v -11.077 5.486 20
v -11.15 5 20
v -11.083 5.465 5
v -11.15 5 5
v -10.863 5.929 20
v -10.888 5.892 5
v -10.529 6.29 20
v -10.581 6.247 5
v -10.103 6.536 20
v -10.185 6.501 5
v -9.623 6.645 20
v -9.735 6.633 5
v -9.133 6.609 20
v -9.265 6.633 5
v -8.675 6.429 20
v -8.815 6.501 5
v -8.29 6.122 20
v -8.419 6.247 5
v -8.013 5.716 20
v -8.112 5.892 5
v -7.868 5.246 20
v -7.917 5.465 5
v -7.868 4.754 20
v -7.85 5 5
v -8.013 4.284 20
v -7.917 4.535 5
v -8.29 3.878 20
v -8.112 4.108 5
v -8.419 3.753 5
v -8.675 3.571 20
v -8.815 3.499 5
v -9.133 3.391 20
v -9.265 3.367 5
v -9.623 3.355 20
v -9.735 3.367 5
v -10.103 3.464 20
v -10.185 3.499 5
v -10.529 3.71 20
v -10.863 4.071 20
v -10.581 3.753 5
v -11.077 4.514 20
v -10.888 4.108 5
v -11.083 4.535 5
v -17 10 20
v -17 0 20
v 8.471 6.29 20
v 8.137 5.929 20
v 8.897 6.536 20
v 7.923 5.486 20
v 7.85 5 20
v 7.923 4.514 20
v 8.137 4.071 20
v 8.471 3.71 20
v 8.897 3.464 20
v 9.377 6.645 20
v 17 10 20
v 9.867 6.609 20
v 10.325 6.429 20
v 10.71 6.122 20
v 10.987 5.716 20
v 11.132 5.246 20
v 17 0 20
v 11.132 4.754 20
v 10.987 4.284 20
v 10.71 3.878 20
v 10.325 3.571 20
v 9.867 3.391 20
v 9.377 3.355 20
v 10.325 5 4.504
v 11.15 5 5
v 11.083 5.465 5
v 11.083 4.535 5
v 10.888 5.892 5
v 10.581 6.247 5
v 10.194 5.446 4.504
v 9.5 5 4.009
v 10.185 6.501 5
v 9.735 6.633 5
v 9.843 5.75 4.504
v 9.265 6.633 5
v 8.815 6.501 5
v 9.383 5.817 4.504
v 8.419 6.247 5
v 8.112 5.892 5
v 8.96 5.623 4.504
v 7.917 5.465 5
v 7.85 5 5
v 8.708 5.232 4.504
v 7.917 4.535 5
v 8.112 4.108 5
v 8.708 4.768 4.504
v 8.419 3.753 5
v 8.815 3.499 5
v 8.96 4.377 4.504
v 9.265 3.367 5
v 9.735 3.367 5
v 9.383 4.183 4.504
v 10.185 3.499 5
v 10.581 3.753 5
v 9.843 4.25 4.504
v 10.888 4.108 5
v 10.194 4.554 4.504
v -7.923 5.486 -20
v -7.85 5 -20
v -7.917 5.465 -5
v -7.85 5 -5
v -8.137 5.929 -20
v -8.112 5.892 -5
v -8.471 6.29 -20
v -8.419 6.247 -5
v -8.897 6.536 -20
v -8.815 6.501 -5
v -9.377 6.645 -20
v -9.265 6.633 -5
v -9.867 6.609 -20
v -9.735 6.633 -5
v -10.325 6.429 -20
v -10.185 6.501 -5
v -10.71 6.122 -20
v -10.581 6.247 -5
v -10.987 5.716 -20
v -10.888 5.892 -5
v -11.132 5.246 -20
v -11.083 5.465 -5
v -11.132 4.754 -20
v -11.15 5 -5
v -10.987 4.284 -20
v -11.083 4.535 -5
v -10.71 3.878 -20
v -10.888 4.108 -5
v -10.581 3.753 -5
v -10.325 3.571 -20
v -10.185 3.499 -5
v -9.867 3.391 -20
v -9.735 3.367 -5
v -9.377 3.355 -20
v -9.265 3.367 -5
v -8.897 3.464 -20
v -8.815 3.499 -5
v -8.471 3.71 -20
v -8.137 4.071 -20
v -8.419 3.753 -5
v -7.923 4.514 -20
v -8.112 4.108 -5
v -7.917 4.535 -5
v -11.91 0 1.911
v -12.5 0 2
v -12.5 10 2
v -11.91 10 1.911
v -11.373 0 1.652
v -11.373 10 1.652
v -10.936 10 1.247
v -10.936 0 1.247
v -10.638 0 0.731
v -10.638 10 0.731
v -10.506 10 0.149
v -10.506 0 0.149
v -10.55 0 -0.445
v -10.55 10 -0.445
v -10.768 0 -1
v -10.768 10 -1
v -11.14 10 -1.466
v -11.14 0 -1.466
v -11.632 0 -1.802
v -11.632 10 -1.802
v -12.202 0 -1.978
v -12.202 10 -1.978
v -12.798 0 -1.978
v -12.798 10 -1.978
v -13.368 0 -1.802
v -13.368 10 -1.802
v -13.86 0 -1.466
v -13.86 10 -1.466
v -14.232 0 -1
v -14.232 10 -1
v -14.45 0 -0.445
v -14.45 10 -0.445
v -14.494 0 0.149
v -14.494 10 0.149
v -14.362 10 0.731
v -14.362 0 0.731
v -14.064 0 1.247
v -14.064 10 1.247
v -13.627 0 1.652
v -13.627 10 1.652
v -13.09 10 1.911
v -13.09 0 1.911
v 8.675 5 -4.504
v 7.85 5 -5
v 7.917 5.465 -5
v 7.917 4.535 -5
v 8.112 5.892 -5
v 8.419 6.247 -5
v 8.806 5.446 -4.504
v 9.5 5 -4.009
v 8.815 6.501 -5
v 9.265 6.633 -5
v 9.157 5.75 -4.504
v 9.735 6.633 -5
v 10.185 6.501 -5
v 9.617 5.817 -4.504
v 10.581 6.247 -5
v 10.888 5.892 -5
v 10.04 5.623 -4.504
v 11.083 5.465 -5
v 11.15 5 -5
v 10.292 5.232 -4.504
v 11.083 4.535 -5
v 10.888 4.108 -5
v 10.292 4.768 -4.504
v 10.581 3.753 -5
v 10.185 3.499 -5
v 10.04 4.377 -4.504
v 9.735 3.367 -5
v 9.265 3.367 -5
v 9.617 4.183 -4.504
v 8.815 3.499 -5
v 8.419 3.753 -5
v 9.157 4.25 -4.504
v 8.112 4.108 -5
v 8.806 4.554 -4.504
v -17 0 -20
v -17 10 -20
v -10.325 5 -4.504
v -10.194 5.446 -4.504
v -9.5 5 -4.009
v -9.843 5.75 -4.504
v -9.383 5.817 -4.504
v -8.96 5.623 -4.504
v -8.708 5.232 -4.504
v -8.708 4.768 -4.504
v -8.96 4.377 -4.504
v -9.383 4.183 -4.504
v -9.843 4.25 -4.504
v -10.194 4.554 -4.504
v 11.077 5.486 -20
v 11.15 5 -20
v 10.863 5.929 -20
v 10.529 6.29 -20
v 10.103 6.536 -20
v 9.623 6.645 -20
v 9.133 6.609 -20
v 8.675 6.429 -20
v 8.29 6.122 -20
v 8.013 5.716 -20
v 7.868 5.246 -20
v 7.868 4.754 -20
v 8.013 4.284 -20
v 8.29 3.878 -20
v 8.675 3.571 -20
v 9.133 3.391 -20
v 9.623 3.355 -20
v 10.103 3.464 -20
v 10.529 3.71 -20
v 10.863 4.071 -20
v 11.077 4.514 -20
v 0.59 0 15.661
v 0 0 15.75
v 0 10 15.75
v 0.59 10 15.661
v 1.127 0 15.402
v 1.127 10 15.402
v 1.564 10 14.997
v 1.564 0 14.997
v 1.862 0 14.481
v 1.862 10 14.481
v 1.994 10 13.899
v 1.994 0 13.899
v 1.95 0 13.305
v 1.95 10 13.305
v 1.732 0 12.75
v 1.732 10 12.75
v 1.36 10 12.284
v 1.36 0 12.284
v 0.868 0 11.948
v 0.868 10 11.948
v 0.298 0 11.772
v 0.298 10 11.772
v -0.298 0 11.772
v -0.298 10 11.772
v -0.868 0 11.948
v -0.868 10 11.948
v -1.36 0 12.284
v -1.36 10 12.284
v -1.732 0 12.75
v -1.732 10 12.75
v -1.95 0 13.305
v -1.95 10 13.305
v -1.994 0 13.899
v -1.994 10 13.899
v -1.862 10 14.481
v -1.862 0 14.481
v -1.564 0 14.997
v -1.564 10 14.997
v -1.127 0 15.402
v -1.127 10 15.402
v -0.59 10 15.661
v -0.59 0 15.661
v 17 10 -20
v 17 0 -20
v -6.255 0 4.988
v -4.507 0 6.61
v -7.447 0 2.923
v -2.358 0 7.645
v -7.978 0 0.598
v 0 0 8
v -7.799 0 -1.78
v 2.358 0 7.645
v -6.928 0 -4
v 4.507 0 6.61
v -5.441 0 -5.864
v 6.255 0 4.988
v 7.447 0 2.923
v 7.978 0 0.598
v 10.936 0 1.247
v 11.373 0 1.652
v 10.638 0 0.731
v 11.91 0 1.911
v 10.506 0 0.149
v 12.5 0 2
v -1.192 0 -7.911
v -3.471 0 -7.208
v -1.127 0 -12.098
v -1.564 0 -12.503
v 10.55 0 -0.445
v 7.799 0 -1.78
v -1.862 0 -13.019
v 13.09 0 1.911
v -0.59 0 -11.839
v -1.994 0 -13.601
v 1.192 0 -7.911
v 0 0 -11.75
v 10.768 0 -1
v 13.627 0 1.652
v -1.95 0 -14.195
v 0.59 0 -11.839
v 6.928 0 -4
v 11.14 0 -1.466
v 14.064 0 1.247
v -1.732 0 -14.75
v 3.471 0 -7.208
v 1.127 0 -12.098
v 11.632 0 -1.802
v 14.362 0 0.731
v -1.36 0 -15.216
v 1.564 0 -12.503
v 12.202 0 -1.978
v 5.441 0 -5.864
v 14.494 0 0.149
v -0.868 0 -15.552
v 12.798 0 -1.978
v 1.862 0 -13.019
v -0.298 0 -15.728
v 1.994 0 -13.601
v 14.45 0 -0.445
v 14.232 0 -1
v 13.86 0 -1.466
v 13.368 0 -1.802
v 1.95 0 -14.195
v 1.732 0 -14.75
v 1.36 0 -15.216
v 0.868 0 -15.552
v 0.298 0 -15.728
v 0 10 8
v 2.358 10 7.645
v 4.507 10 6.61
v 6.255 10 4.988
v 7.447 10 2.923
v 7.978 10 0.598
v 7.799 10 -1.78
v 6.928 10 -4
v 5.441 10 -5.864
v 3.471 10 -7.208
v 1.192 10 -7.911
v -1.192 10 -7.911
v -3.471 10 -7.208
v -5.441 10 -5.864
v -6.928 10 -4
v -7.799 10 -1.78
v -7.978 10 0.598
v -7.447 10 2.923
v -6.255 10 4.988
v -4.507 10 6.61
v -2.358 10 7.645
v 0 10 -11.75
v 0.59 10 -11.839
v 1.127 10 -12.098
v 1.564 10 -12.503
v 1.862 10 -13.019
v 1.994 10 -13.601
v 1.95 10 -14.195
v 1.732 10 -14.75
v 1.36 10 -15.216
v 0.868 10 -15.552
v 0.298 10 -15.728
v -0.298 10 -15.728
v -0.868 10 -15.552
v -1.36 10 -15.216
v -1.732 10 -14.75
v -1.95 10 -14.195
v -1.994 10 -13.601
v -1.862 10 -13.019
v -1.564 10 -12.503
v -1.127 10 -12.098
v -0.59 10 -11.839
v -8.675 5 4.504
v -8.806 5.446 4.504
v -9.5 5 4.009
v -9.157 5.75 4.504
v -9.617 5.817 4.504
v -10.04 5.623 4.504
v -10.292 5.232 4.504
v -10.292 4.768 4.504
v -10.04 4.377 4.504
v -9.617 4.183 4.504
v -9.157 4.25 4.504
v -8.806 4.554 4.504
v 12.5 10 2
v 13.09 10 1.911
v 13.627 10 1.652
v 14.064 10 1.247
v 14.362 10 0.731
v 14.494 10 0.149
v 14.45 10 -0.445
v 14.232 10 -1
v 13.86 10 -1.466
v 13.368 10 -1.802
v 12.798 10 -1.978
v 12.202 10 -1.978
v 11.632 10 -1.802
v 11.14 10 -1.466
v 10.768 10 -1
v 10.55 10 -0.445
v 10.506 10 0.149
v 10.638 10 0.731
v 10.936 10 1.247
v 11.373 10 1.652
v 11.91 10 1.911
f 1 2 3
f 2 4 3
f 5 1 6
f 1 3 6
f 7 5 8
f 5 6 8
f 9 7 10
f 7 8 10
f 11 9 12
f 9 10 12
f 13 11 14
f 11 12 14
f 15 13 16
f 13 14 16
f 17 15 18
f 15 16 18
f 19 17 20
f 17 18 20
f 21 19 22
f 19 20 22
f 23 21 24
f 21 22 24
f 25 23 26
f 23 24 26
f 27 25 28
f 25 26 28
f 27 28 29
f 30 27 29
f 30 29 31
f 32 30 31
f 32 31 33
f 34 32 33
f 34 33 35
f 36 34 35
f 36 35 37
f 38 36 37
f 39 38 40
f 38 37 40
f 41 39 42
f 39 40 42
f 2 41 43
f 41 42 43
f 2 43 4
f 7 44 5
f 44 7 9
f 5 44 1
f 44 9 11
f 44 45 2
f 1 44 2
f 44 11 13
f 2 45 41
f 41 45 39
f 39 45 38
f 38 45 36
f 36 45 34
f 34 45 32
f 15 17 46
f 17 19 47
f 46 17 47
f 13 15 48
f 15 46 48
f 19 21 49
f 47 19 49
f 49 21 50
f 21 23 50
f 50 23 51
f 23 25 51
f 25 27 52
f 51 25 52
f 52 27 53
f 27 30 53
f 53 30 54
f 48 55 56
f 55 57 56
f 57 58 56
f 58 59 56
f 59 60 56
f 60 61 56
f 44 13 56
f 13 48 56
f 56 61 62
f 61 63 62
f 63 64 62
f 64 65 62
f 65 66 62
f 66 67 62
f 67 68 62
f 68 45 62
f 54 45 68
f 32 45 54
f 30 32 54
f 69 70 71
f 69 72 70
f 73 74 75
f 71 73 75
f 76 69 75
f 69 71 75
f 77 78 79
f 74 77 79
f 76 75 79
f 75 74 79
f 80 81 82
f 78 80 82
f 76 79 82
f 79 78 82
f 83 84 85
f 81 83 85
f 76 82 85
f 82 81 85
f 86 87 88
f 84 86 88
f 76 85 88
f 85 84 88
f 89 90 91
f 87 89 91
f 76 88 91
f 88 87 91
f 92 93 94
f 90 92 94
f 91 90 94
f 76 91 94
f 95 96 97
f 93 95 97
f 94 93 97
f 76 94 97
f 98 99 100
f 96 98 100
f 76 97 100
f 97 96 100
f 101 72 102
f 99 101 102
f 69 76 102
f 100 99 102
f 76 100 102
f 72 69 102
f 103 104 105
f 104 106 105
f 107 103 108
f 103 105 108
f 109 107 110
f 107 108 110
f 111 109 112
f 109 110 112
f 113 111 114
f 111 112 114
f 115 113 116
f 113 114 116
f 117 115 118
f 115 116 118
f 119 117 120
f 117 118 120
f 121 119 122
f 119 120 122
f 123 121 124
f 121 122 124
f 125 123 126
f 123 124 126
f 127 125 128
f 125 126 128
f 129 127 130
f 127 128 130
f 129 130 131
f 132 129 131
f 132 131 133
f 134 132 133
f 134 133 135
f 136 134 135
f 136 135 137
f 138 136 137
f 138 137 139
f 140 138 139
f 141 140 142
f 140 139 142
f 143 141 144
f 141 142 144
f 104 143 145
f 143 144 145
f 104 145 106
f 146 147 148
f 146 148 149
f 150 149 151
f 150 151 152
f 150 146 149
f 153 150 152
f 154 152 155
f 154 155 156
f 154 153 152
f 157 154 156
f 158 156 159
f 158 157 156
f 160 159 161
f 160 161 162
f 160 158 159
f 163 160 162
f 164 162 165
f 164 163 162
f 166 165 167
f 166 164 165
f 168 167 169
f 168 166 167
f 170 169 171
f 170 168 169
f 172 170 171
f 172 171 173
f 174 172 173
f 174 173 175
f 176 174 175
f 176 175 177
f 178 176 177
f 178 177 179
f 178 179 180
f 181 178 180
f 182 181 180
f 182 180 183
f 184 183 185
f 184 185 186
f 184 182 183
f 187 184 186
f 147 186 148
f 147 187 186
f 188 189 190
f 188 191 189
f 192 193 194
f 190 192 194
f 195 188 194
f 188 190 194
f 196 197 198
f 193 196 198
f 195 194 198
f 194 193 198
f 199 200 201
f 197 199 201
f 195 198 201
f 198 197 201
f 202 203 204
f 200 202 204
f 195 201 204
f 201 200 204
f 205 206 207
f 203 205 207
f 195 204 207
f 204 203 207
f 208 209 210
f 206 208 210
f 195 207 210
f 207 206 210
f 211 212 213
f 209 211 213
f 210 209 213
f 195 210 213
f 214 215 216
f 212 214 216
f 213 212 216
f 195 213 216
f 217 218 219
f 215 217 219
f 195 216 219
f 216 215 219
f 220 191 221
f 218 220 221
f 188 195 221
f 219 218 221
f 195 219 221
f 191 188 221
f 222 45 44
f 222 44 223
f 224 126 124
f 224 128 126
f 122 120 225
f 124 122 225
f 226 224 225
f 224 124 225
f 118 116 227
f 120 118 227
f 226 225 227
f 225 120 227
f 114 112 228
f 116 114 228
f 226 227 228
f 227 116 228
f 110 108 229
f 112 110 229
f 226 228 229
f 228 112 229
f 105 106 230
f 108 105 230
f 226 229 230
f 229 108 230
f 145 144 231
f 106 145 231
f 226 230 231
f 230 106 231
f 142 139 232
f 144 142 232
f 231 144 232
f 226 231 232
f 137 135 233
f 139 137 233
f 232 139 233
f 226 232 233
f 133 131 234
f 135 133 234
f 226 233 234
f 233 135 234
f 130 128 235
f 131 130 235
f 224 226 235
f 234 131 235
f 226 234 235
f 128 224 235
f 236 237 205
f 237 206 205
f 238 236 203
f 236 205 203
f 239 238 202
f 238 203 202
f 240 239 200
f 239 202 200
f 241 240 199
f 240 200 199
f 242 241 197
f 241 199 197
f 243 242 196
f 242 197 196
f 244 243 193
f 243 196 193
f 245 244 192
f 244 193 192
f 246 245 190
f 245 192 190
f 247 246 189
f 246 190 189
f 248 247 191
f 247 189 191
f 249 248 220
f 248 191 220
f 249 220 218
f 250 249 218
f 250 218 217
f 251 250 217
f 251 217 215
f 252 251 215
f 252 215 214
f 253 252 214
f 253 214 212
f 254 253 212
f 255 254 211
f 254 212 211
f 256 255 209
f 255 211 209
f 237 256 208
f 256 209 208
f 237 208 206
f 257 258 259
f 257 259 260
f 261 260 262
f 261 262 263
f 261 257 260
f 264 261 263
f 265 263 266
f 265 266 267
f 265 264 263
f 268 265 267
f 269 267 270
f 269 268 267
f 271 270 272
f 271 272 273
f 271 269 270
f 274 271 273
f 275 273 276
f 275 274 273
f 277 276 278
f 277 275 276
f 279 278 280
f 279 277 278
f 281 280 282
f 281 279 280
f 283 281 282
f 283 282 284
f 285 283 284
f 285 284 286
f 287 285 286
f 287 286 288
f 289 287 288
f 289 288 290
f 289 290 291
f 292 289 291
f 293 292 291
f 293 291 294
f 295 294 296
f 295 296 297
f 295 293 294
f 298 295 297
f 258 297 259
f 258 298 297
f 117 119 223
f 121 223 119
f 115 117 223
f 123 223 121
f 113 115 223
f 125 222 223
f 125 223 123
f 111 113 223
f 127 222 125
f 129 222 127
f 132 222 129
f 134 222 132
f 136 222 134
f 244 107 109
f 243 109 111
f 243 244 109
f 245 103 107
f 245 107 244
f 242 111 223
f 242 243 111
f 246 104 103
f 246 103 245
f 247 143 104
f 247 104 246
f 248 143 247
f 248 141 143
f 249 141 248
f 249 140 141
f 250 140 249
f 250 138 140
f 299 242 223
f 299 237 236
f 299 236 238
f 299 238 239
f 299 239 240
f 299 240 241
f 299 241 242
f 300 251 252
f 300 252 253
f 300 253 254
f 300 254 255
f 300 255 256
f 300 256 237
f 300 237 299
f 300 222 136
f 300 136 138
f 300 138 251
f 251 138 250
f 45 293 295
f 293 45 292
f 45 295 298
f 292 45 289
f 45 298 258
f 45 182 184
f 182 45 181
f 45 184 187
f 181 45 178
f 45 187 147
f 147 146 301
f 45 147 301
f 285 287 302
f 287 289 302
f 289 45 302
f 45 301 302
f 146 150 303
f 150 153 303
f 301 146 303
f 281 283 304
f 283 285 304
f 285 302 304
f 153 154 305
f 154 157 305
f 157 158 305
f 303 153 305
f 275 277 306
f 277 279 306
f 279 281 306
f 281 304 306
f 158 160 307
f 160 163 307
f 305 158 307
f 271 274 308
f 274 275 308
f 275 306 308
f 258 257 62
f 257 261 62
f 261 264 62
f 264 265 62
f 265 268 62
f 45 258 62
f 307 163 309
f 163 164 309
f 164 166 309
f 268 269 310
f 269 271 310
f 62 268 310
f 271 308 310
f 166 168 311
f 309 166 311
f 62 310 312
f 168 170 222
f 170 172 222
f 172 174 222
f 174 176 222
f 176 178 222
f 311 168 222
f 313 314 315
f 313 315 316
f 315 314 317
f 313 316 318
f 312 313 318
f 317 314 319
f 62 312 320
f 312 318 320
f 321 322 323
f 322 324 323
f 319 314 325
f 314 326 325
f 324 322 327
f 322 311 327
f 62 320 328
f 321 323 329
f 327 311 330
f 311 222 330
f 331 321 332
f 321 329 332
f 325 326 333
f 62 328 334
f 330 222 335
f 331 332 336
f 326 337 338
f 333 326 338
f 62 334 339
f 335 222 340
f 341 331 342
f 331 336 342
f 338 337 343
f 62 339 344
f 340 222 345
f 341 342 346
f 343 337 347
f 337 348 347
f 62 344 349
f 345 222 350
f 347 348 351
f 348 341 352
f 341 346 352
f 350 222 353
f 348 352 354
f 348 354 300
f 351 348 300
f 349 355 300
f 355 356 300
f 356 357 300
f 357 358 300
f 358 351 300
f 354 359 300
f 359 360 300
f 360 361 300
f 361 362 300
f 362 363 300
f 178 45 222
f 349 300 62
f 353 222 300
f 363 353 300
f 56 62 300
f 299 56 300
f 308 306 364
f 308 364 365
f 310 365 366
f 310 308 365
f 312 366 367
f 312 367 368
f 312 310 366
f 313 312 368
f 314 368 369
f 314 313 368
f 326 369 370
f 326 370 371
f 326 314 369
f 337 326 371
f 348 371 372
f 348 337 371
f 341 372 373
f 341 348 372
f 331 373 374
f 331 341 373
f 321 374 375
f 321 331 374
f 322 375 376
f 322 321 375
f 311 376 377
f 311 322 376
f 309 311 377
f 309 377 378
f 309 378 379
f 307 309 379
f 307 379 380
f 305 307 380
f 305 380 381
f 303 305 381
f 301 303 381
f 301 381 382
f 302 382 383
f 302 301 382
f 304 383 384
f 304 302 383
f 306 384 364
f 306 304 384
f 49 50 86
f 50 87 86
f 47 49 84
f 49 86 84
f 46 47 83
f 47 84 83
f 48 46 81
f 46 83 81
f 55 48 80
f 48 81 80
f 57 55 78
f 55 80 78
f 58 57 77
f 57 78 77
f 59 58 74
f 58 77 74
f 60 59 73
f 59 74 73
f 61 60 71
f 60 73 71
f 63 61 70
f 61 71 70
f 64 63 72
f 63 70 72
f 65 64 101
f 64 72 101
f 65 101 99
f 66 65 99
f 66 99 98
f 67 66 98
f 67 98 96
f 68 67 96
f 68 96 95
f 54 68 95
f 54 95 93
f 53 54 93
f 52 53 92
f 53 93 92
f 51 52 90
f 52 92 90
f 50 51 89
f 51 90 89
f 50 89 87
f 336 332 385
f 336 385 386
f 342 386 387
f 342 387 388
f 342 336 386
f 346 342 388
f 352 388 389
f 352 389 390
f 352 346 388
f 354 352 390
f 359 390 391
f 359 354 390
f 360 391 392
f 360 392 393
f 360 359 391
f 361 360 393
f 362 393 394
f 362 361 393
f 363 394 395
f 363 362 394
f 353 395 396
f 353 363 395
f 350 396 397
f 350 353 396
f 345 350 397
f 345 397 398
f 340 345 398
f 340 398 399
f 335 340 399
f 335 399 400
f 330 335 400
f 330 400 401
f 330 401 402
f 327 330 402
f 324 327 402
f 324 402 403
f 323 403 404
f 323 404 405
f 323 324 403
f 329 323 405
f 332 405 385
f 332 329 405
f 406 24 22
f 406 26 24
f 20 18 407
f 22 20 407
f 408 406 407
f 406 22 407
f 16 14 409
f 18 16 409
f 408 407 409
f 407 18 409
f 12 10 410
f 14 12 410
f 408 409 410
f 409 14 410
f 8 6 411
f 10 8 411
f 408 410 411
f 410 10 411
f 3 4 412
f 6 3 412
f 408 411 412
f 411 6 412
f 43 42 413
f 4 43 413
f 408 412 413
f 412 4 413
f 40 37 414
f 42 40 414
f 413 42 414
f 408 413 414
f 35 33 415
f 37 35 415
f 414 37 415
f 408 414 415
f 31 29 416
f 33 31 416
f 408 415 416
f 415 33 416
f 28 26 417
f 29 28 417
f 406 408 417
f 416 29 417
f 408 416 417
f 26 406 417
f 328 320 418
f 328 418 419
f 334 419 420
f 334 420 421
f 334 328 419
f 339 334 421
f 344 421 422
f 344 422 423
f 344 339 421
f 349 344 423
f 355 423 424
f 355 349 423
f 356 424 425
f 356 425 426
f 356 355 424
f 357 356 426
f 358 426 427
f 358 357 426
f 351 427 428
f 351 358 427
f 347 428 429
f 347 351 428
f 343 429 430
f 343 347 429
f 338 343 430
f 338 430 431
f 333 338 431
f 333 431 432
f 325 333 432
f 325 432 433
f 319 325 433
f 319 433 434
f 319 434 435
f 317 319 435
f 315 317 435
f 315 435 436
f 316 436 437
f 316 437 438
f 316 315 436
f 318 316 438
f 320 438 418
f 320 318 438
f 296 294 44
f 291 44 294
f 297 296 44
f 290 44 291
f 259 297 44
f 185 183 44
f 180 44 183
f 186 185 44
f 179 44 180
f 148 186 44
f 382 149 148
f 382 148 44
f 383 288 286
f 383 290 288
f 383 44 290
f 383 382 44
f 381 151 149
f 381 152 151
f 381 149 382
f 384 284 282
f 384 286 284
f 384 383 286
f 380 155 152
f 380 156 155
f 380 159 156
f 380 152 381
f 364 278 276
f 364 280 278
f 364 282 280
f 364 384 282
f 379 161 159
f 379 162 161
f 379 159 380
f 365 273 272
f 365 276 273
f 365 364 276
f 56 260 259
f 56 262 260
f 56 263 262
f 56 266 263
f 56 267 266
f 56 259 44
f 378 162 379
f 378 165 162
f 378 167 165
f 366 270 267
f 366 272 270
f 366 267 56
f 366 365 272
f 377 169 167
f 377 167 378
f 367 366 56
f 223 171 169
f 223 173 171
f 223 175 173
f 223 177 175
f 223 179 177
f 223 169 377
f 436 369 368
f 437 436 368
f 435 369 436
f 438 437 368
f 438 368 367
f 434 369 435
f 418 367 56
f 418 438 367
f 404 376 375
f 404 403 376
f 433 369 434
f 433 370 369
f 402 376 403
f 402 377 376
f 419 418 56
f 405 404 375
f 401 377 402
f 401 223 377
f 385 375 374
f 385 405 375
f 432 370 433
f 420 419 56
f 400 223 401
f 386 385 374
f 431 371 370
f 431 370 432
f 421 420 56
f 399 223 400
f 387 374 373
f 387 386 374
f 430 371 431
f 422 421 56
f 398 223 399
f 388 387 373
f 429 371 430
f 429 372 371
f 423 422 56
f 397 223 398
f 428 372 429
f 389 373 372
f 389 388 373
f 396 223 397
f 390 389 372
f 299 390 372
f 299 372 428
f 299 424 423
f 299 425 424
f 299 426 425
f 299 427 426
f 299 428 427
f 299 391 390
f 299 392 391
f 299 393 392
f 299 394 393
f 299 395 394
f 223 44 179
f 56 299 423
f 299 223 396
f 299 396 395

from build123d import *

# Parameters (mm, degrees)
SKETCH1_W                           = 34
SKETCH1_H                           = 40
SKETCH1_R                           = 8
SKETCH1_R_2                         = 2
BOSS_EXTRUDE1_DEPTH                 = 10
M4X0_7_TAPPED_HOLE1_D               = 3.3
M4X0_7_TAPPED_HOLE1_DEPTH           = 15
M4X0_7_TAPPED_HOLE1_TIP             = 0.991420021
M4X0_7_TAPPED_HOLE1_ON_FACE_2_D     = 3.3
M4X0_7_TAPPED_HOLE1_ON_FACE_2_DEPTH = 15
M4X0_7_TAPPED_HOLE1_ON_FACE_2_TIP   = 0.991420021


with BuildPart() as part:
    # Sketch1 → Boss-Extrude1 (new body)
    with BuildSketch(Plane(origin=(0, 0, 0), x_dir=(1, 0, 0), z_dir=(0, 1, 0))):
        Rectangle(SKETCH1_W, SKETCH1_H)
        with Locations(Location((0, 0, 0), (0, 0, 270))):
            Circle(SKETCH1_R, mode=Mode.SUBTRACT)
        with Locations(Location((0, 13.75, 0), (0, 0, 270))):
            Circle(SKETCH1_R_2, mode=Mode.SUBTRACT)
        with Locations(Location((0, -13.75, 0), (0, 0, 270))):
            Circle(SKETCH1_R_2, mode=Mode.SUBTRACT)
        with Locations(Location((-12.5, 0, 0), (0, 0, 270))):
            Circle(SKETCH1_R_2, mode=Mode.SUBTRACT)
        with Locations(Location((12.5, 0, 0), (0, 0, 270))):
            Circle(SKETCH1_R_2, mode=Mode.SUBTRACT)
    extrude(amount=BOSS_EXTRUDE1_DEPTH)

    # M4x0.7 Tapped Hole1
    with Locations(Plane(origin=(9.5, 5, -20), x_dir=(-1, 0, 0), z_dir=(0, 0, -1))):
        with Locations((0, 0), (19, 0)):
            Hole(M4X0_7_TAPPED_HOLE1_D / 2, depth=M4X0_7_TAPPED_HOLE1_DEPTH)
            with Locations((0, 0, -(M4X0_7_TAPPED_HOLE1_DEPTH + M4X0_7_TAPPED_HOLE1_TIP / 2))):  # 118° drill point
                Cone(0, M4X0_7_TAPPED_HOLE1_D / 2, M4X0_7_TAPPED_HOLE1_TIP, mode=Mode.SUBTRACT)

    # M4x0.7 Tapped Hole1 on face 2
    with Locations(Plane(origin=(-9.5, 5, 20), x_dir=(1, 0, 0), z_dir=(0, 0, 1))):
        with Locations((0, 0), (19, 0)):
            Hole(M4X0_7_TAPPED_HOLE1_ON_FACE_2_D / 2, depth=M4X0_7_TAPPED_HOLE1_ON_FACE_2_DEPTH)
            with Locations((0, 0, -(M4X0_7_TAPPED_HOLE1_ON_FACE_2_DEPTH + M4X0_7_TAPPED_HOLE1_ON_FACE_2_TIP / 2))):  # 118° drill point
                Cone(0, M4X0_7_TAPPED_HOLE1_ON_FACE_2_D / 2, M4X0_7_TAPPED_HOLE1_ON_FACE_2_TIP, mode=Mode.SUBTRACT)


solid = part.part
